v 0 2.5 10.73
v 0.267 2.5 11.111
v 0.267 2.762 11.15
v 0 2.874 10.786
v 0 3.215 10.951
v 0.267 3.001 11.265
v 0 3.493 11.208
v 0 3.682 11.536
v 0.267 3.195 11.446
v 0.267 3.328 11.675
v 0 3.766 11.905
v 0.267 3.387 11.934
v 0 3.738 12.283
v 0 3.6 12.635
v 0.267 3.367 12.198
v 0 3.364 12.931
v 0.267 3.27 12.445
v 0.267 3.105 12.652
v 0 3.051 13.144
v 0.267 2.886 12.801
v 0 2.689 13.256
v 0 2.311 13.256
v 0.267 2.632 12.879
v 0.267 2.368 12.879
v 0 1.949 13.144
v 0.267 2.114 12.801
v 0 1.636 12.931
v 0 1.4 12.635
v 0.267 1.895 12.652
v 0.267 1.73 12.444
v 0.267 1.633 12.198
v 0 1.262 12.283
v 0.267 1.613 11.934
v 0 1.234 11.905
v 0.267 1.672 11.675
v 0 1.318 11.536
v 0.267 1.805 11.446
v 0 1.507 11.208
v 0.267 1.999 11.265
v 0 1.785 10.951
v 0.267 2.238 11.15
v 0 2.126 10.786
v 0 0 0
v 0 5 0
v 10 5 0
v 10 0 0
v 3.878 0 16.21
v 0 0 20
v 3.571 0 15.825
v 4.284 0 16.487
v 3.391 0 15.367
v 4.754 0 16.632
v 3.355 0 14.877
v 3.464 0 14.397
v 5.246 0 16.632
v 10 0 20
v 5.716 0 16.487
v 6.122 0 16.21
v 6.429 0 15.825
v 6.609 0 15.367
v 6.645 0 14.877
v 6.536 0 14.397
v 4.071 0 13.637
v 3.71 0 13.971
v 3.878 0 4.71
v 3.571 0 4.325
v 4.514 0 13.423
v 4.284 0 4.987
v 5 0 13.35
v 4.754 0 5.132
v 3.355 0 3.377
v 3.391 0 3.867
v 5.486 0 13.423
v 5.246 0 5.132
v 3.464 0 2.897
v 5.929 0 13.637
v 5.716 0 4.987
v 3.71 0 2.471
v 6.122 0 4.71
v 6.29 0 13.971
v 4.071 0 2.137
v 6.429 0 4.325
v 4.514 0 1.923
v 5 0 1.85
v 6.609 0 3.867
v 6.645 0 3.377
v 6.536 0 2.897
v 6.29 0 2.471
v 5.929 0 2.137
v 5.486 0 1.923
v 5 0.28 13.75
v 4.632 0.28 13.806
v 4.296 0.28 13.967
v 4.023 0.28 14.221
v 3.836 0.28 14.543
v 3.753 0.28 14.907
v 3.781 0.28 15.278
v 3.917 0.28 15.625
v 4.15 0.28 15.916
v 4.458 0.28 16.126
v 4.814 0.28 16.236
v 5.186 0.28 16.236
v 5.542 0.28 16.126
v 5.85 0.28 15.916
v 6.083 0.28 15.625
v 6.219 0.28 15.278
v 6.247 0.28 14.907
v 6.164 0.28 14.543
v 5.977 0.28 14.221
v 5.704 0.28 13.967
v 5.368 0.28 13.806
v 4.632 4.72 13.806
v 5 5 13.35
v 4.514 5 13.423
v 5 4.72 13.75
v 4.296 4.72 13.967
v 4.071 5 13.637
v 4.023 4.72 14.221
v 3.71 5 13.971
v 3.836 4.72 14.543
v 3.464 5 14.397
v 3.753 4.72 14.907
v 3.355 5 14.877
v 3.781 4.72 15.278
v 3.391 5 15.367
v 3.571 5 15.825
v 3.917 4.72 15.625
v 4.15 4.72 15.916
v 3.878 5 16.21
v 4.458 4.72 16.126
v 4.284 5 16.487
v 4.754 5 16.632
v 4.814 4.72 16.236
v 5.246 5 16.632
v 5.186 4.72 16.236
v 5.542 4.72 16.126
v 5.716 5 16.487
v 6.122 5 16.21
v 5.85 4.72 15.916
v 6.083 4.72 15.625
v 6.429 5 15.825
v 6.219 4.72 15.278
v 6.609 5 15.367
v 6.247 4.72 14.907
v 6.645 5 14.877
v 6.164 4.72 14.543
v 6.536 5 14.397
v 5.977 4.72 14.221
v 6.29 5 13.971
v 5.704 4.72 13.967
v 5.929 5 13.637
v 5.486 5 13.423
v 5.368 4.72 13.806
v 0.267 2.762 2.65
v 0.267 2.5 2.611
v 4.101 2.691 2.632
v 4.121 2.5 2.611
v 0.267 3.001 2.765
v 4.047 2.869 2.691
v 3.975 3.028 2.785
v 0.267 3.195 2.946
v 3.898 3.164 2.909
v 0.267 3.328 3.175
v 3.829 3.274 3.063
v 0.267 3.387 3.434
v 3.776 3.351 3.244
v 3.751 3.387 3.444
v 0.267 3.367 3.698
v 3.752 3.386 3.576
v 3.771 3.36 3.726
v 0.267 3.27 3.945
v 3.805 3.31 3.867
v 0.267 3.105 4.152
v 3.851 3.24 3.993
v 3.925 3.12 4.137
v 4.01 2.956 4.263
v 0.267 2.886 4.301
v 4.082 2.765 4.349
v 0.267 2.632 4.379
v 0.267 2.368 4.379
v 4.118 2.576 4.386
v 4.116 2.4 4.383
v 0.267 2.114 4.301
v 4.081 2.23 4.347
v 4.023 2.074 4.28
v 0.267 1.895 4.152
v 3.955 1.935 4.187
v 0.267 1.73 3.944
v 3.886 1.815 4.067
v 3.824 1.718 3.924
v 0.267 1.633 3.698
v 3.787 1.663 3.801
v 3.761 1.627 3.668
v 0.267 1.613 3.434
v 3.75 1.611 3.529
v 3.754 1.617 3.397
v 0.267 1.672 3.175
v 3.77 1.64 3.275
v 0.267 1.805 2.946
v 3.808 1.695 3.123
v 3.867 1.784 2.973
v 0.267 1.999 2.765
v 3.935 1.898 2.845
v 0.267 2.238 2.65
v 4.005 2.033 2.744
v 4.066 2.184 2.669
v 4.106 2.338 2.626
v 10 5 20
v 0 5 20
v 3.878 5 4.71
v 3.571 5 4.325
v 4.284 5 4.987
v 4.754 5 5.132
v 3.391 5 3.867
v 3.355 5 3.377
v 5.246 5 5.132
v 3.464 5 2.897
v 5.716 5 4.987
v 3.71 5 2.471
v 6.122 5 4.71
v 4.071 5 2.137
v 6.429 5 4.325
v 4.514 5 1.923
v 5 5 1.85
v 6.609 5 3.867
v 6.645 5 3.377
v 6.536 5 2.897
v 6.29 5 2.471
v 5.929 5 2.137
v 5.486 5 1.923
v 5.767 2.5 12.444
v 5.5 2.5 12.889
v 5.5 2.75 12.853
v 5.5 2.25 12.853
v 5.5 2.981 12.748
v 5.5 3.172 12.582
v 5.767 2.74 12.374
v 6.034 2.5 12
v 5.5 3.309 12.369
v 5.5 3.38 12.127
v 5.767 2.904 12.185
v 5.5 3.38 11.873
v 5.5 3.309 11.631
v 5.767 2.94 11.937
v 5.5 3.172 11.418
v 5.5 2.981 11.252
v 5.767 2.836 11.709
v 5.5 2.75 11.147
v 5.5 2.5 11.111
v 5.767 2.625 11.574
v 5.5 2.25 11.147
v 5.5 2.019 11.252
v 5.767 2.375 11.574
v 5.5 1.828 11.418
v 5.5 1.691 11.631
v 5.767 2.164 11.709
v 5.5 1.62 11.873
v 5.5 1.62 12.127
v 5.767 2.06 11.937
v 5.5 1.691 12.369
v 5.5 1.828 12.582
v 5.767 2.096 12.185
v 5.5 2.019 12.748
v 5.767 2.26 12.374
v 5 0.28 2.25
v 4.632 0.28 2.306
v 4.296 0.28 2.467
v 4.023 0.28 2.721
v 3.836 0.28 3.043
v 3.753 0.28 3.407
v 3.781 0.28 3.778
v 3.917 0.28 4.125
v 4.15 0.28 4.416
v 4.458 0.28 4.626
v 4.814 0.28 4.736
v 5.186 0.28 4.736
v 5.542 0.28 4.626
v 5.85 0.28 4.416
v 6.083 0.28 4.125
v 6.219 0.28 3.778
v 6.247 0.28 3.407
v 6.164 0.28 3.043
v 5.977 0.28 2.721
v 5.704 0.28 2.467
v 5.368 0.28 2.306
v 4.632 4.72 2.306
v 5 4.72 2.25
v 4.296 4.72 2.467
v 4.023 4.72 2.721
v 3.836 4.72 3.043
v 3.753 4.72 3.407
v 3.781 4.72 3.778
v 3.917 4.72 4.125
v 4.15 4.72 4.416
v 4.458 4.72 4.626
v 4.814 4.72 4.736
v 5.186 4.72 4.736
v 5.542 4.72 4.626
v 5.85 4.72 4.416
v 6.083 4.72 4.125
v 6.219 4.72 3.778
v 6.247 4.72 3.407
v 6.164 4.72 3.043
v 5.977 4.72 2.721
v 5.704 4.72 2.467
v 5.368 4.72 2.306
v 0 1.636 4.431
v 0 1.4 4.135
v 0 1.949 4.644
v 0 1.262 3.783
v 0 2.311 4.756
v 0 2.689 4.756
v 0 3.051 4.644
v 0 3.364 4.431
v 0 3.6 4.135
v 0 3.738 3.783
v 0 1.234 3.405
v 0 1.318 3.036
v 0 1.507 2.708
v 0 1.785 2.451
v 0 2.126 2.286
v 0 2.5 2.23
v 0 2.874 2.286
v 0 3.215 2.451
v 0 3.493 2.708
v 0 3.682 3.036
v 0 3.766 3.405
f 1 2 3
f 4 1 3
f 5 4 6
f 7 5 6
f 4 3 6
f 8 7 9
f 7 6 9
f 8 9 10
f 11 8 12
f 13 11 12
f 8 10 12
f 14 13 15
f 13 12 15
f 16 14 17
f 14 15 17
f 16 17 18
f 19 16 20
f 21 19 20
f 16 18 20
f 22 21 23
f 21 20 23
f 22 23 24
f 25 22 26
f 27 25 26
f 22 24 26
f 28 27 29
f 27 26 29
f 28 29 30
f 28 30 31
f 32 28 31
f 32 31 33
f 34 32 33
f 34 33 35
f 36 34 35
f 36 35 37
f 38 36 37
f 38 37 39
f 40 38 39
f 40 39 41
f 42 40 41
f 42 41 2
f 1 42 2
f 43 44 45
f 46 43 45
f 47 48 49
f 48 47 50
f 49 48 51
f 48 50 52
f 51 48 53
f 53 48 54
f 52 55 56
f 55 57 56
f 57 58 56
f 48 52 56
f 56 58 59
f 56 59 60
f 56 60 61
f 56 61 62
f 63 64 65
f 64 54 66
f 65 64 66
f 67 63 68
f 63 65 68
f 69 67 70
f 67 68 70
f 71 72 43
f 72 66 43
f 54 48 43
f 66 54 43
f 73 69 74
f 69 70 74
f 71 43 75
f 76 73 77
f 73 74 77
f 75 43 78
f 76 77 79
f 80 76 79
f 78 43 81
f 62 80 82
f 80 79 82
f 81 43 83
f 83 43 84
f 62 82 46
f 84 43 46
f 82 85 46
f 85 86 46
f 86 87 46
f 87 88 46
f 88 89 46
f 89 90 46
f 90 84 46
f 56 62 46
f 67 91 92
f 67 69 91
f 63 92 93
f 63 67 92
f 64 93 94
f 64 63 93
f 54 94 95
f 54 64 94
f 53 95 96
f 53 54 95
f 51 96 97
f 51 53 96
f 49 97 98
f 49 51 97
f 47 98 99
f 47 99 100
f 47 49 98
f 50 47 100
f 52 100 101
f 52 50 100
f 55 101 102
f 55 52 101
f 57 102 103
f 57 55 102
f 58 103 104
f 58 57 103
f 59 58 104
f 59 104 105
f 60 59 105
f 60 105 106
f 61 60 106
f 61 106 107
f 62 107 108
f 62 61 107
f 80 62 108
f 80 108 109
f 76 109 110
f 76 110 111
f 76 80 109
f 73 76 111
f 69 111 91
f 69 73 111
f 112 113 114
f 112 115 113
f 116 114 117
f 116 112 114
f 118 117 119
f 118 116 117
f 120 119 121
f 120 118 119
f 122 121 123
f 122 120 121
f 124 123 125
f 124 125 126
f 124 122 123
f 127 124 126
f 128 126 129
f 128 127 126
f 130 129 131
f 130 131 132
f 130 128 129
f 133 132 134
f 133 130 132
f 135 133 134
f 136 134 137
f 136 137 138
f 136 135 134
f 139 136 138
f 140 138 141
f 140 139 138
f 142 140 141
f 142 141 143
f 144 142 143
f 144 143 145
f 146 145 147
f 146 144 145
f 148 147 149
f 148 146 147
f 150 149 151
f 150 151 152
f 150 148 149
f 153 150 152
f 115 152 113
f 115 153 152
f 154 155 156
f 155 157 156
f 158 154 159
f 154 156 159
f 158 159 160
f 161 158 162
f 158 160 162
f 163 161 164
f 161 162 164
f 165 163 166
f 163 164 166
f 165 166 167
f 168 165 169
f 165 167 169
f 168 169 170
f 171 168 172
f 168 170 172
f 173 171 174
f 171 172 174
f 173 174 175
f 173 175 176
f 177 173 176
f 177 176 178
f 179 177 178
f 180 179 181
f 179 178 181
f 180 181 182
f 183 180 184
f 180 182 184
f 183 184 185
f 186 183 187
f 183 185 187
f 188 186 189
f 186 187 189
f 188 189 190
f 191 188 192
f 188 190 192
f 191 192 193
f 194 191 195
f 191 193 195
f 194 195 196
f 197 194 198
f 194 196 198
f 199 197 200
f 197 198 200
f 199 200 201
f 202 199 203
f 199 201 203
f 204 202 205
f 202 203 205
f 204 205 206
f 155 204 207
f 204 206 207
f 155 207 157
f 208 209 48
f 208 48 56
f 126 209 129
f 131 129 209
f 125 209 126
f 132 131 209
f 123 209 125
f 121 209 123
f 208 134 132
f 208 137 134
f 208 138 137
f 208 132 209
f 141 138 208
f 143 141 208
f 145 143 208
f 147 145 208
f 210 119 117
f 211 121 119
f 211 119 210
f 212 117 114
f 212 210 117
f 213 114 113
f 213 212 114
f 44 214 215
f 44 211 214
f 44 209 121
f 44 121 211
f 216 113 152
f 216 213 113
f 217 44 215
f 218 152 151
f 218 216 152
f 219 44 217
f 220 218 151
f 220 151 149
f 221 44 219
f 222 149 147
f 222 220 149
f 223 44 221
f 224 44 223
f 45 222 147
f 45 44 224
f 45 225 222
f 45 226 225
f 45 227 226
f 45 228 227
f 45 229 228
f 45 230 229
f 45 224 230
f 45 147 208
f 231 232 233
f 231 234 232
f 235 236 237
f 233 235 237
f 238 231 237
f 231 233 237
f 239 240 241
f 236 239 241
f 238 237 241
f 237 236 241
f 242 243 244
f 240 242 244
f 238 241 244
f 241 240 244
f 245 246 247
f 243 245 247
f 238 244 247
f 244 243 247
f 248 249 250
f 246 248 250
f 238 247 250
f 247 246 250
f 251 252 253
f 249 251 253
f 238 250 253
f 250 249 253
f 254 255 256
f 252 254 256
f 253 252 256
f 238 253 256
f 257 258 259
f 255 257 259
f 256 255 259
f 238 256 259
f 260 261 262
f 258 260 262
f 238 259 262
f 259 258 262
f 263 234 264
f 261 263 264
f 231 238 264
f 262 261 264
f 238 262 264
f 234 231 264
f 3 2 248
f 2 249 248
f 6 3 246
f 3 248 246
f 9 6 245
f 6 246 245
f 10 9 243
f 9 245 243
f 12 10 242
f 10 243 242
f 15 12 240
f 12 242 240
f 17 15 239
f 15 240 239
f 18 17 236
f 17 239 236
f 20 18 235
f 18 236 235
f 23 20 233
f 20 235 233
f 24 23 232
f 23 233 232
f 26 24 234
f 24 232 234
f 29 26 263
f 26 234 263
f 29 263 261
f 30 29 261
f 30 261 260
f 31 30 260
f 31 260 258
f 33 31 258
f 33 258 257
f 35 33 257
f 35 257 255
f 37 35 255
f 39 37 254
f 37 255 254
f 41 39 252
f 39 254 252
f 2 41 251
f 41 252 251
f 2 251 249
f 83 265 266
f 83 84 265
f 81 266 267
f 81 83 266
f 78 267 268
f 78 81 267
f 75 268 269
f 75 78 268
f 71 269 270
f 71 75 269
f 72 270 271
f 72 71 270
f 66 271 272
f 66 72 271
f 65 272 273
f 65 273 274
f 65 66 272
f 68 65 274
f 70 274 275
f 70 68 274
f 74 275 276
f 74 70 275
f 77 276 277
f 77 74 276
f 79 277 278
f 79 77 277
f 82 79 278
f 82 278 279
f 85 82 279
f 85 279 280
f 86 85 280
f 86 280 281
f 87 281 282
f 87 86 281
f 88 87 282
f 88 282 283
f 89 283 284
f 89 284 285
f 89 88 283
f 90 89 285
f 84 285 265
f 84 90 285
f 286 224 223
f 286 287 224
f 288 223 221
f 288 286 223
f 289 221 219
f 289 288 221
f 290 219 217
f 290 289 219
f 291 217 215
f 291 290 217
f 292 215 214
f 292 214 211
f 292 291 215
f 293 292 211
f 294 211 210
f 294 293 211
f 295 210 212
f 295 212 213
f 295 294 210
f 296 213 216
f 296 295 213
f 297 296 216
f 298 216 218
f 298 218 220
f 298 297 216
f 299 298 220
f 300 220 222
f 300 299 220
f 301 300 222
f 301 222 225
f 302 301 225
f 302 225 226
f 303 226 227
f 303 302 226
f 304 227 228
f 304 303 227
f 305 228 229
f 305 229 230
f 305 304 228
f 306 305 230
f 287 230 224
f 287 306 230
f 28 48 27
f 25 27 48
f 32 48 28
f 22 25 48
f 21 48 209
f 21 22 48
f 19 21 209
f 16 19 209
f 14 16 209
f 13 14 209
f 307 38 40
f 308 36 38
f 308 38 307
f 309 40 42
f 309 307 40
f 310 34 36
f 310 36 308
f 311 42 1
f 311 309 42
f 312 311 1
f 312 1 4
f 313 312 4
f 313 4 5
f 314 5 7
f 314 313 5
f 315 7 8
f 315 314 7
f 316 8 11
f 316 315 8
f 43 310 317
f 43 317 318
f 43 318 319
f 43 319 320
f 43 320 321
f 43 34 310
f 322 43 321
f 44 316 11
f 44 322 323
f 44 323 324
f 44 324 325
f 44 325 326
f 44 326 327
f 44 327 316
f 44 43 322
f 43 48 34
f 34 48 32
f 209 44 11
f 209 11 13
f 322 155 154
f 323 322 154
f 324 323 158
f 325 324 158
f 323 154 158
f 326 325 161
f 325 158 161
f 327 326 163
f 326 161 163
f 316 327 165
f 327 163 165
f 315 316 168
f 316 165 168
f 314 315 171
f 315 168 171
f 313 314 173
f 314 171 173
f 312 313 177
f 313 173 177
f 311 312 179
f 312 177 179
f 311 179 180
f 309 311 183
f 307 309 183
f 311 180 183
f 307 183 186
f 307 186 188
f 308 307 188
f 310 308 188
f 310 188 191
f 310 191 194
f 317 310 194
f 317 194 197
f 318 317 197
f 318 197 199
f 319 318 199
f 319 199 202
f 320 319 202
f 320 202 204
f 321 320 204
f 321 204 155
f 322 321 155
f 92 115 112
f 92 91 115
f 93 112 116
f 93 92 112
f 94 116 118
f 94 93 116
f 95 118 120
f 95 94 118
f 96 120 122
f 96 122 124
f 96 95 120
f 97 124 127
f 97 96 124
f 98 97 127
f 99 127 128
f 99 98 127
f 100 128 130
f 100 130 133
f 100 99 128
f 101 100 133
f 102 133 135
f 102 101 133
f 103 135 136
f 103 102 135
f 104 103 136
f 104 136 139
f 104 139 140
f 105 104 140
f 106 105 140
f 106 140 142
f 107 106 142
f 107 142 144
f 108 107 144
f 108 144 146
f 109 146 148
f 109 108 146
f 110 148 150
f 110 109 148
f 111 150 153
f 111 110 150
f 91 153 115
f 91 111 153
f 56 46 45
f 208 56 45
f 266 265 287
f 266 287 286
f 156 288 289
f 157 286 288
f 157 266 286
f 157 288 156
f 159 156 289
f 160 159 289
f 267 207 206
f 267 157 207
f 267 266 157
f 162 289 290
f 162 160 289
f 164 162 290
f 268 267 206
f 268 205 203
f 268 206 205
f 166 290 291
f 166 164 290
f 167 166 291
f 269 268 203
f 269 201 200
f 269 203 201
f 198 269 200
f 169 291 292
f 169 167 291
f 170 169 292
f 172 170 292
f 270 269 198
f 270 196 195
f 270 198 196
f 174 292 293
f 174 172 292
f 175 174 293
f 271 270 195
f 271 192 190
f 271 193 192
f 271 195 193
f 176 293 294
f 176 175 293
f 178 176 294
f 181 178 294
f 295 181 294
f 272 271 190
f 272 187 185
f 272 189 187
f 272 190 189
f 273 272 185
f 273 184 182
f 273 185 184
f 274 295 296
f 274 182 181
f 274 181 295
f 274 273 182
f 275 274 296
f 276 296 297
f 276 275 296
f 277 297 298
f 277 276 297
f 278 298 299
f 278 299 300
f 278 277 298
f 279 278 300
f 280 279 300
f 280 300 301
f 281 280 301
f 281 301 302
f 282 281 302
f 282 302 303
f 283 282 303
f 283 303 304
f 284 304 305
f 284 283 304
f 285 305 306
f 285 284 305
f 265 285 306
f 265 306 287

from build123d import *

# Parameters (mm, degrees)
SKETCH_1_W                    = 10
SKETCH_1_H                    = 5
EXTRUDE_1_DEPTH               = 20
M3X0_51_AT_2_COUNT            = 2
M3X0_51_AT_2_PITCH            = 11.5
HOLE_WIZARD_2_561_D           = 1.778
HOLE_WIZARD_2_561_DEPTH       = 5.5
HOLE_WIZARD_2_561_CSINK_D     = 2.54
HOLE_WIZARD_2_561_CSINK_ANGLE = 110
HOLE_WIZARD_2_561_TIP         = 0.53416509


with BuildPart() as part:
    # Эскиз1 → Бобышка-Вытянуть1 (new body)
    with BuildSketch(Plane.XY):
        with Locations((5, 2.5)):
            Rectangle(SKETCH_1_W, SKETCH_1_H)
    extrude(amount=EXTRUDE_1_DEPTH)

    # Эскиз4 → Отверстие обработанное метчиком M3x0.51 (revolve, cut)
    with BuildSketch(Plane(origin=(5, 0, 15), x_dir=(0, 0, -1), z_dir=(1, 0, 0))):
        Polygon((0, 0), (0, 5), (1.65, 5), (1.25, 4.719916985), (1.25, 0.280083015), (1.65, 0), align=None)
    m3x0_51 = revolve(axis=Axis((5, -6.35, 15), (0, 1, 0)), mode=Mode.SUBTRACT)

    # Отверстие обработанное метчиком M3x0.51 at 2: Отверстие обработанное метчиком M3x0.51 ×2
    with Locations(*[(0, 0, -i * M3X0_51_AT_2_PITCH) for i in range(1, M3X0_51_AT_2_COUNT)]):
        add(m3x0_51, mode=Mode.SUBTRACT)

    # Отверстие обработанное метчиком #2-561
    with Locations(Plane.ZY):
        with Locations((3.5, 2.5), (12, 2.5)):
            CounterSinkHole(HOLE_WIZARD_2_561_D / 2, HOLE_WIZARD_2_561_CSINK_D / 2, depth=HOLE_WIZARD_2_561_DEPTH, counter_sink_angle=HOLE_WIZARD_2_561_CSINK_ANGLE)
            with Locations((0, 0, -(HOLE_WIZARD_2_561_DEPTH + HOLE_WIZARD_2_561_TIP / 2))):  # 118° drill point
                Cone(0, HOLE_WIZARD_2_561_D / 2, HOLE_WIZARD_2_561_TIP, mode=Mode.SUBTRACT)


solid = part.part
